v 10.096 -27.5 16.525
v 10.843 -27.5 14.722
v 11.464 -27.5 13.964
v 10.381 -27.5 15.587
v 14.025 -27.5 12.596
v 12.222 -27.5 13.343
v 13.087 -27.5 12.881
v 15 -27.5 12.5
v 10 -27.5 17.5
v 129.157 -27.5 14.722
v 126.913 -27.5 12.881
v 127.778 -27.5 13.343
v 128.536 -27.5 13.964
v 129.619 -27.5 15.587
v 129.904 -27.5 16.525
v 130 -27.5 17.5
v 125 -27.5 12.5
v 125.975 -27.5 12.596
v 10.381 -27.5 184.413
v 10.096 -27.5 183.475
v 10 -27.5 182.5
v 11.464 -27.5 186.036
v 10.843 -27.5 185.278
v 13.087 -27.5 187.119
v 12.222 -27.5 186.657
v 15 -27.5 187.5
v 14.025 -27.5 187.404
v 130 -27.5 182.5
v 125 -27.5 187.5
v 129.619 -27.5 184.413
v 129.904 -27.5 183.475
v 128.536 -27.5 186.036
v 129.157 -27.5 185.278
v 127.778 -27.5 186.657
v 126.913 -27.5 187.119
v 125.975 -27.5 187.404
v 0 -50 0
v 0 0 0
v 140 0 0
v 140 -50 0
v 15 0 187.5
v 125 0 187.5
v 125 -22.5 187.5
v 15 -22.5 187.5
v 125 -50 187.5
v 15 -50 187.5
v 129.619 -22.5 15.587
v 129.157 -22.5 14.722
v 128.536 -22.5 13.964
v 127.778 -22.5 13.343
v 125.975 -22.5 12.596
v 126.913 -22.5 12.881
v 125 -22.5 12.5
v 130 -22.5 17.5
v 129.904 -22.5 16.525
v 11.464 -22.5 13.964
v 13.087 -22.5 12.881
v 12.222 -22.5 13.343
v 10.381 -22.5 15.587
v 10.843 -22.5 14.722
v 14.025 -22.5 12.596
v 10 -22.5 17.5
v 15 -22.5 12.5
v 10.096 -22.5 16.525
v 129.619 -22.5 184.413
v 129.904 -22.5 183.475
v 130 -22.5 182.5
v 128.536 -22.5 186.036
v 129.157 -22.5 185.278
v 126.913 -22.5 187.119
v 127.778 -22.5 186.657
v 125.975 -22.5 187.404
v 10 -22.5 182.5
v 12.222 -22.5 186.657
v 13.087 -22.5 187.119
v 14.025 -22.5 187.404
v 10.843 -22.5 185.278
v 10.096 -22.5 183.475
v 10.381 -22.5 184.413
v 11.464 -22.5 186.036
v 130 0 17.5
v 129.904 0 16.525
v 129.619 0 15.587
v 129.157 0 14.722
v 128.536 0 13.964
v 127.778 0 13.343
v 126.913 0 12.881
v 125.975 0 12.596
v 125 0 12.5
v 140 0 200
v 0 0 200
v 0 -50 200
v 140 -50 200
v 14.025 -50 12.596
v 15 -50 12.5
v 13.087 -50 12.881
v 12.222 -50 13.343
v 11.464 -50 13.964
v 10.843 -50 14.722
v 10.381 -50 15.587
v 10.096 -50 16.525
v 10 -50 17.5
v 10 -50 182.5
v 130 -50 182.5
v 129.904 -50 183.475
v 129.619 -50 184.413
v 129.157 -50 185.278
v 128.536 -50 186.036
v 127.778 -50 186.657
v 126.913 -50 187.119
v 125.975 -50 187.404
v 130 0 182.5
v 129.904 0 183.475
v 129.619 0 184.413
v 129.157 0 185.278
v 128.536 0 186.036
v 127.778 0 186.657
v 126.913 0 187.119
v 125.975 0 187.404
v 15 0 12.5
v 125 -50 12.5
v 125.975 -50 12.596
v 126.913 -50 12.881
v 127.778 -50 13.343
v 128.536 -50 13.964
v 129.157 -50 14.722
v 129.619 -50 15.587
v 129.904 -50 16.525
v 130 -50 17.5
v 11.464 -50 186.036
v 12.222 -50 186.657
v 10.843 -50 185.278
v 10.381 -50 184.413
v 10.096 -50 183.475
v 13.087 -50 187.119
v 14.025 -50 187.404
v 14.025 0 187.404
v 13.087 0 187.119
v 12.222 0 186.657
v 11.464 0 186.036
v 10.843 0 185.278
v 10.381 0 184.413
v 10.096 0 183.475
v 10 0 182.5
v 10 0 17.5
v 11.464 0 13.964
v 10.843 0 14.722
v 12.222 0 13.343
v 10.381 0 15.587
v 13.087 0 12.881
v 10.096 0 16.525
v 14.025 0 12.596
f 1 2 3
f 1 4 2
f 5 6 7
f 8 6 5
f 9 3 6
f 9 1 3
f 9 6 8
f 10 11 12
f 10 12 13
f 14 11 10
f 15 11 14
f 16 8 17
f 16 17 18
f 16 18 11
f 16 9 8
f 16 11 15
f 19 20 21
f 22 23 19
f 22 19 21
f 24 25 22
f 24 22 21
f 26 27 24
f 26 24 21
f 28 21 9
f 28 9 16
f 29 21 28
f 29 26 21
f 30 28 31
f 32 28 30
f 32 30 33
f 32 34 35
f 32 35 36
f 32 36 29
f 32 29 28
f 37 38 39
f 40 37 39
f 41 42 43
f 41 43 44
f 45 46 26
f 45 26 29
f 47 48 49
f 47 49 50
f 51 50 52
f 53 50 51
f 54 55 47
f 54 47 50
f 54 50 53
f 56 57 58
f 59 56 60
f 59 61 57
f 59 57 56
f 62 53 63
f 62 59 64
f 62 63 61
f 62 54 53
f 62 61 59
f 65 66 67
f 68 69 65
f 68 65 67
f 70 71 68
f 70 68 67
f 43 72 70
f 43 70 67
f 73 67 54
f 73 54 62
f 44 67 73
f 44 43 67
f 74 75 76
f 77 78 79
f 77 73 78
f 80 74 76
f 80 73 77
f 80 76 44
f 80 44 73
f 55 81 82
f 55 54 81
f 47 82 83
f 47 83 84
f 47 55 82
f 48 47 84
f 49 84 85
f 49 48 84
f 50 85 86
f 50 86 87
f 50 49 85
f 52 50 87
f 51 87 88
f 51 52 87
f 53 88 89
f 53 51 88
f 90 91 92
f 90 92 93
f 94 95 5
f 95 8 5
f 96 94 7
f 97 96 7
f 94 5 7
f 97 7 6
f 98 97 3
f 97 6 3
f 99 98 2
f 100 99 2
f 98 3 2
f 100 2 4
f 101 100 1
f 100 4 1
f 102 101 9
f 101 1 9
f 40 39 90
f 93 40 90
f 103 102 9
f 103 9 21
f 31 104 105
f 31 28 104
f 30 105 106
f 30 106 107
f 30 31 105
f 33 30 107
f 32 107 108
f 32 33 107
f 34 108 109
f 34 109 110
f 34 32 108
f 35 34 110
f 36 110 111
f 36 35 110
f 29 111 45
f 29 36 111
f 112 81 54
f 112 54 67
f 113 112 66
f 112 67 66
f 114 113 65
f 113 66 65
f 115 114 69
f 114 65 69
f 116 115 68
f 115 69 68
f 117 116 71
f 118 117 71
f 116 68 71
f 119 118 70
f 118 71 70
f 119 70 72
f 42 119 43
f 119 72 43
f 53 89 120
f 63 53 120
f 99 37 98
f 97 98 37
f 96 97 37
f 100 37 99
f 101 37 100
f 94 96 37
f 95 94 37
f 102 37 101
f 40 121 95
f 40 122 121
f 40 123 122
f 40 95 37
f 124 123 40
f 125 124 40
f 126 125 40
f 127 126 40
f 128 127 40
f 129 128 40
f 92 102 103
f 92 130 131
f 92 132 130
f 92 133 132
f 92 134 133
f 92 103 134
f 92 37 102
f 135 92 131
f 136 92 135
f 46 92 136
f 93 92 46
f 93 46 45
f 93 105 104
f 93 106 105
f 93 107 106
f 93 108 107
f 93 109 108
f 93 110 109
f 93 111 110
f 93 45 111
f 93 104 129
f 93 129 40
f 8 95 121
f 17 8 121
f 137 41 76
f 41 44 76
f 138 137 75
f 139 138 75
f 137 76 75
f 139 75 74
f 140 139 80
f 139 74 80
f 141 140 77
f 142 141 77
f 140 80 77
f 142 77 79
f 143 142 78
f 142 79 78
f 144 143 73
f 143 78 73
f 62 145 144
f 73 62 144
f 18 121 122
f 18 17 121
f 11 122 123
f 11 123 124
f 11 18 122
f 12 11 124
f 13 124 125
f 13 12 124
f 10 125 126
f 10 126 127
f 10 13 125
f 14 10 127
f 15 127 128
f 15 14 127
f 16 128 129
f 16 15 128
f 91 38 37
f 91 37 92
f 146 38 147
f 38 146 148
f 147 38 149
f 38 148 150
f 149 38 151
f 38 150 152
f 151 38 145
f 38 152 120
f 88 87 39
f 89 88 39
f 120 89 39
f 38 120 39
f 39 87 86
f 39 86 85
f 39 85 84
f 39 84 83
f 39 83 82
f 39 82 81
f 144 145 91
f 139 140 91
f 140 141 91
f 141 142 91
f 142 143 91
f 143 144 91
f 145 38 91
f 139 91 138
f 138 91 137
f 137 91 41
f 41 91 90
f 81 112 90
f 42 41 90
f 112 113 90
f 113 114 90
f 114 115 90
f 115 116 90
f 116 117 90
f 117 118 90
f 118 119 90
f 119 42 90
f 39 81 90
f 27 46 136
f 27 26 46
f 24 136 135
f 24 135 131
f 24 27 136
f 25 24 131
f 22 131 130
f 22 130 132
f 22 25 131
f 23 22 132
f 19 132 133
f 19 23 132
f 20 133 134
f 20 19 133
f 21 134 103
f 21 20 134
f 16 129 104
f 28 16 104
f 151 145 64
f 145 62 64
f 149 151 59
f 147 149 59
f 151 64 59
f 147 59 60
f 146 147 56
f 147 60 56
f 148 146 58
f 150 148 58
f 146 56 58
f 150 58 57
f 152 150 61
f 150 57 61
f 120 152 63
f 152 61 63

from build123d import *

# Parameters (mm, degrees)
F0_W     = 140
F0_H     = 200
F1_DEPTH = 50
F2_W     = 120
F2_H     = 175
F3_DEPTH = 22.5
F4_W     = 120
F4_H     = 175
F5_DEPTH = 22.5
F6_R     = 5


with BuildPart() as f1:
    # F0 (on Front) → F1 (new body)
    with BuildSketch(Plane.XZ):
        with Locations((70, 100)):
            Rectangle(F0_W, F0_H)
    extrude(amount=F1_DEPTH)

    # F2 (on face) → F3 (cut)
    with BuildSketch(Plane.XZ.offset(50)):
        with Locations((70, 100)):
            Rectangle(F2_W, F2_H)
    extrude(amount=-F3_DEPTH, mode=Mode.SUBTRACT)

    # F4 (on face) → F5 (cut)
    with BuildSketch(Plane(origin=(0, 0, 0), x_dir=(-1, 0, 0), z_dir=(0, 1, 0))):
        with Locations((-70, 100)):
            Rectangle(F4_W, F4_H)
    extrude(amount=-F5_DEPTH, mode=Mode.SUBTRACT)

    # F6
    f6_edges = [f1.edges().sort_by_distance(p)[0] for p in [
        (130, -38.75, 187.5),
        (10, -38.75, 187.5),
        (10, -38.75, 12.5),
        (130, -38.75, 12.5),
        (130, -11.25, 187.5),
        (10, -11.25, 187.5),
        (10, -11.25, 12.5),
        (130, -11.25, 12.5),
    ]]
    fillet(f6_edges, radius=F6_R)


solid = f1.part
